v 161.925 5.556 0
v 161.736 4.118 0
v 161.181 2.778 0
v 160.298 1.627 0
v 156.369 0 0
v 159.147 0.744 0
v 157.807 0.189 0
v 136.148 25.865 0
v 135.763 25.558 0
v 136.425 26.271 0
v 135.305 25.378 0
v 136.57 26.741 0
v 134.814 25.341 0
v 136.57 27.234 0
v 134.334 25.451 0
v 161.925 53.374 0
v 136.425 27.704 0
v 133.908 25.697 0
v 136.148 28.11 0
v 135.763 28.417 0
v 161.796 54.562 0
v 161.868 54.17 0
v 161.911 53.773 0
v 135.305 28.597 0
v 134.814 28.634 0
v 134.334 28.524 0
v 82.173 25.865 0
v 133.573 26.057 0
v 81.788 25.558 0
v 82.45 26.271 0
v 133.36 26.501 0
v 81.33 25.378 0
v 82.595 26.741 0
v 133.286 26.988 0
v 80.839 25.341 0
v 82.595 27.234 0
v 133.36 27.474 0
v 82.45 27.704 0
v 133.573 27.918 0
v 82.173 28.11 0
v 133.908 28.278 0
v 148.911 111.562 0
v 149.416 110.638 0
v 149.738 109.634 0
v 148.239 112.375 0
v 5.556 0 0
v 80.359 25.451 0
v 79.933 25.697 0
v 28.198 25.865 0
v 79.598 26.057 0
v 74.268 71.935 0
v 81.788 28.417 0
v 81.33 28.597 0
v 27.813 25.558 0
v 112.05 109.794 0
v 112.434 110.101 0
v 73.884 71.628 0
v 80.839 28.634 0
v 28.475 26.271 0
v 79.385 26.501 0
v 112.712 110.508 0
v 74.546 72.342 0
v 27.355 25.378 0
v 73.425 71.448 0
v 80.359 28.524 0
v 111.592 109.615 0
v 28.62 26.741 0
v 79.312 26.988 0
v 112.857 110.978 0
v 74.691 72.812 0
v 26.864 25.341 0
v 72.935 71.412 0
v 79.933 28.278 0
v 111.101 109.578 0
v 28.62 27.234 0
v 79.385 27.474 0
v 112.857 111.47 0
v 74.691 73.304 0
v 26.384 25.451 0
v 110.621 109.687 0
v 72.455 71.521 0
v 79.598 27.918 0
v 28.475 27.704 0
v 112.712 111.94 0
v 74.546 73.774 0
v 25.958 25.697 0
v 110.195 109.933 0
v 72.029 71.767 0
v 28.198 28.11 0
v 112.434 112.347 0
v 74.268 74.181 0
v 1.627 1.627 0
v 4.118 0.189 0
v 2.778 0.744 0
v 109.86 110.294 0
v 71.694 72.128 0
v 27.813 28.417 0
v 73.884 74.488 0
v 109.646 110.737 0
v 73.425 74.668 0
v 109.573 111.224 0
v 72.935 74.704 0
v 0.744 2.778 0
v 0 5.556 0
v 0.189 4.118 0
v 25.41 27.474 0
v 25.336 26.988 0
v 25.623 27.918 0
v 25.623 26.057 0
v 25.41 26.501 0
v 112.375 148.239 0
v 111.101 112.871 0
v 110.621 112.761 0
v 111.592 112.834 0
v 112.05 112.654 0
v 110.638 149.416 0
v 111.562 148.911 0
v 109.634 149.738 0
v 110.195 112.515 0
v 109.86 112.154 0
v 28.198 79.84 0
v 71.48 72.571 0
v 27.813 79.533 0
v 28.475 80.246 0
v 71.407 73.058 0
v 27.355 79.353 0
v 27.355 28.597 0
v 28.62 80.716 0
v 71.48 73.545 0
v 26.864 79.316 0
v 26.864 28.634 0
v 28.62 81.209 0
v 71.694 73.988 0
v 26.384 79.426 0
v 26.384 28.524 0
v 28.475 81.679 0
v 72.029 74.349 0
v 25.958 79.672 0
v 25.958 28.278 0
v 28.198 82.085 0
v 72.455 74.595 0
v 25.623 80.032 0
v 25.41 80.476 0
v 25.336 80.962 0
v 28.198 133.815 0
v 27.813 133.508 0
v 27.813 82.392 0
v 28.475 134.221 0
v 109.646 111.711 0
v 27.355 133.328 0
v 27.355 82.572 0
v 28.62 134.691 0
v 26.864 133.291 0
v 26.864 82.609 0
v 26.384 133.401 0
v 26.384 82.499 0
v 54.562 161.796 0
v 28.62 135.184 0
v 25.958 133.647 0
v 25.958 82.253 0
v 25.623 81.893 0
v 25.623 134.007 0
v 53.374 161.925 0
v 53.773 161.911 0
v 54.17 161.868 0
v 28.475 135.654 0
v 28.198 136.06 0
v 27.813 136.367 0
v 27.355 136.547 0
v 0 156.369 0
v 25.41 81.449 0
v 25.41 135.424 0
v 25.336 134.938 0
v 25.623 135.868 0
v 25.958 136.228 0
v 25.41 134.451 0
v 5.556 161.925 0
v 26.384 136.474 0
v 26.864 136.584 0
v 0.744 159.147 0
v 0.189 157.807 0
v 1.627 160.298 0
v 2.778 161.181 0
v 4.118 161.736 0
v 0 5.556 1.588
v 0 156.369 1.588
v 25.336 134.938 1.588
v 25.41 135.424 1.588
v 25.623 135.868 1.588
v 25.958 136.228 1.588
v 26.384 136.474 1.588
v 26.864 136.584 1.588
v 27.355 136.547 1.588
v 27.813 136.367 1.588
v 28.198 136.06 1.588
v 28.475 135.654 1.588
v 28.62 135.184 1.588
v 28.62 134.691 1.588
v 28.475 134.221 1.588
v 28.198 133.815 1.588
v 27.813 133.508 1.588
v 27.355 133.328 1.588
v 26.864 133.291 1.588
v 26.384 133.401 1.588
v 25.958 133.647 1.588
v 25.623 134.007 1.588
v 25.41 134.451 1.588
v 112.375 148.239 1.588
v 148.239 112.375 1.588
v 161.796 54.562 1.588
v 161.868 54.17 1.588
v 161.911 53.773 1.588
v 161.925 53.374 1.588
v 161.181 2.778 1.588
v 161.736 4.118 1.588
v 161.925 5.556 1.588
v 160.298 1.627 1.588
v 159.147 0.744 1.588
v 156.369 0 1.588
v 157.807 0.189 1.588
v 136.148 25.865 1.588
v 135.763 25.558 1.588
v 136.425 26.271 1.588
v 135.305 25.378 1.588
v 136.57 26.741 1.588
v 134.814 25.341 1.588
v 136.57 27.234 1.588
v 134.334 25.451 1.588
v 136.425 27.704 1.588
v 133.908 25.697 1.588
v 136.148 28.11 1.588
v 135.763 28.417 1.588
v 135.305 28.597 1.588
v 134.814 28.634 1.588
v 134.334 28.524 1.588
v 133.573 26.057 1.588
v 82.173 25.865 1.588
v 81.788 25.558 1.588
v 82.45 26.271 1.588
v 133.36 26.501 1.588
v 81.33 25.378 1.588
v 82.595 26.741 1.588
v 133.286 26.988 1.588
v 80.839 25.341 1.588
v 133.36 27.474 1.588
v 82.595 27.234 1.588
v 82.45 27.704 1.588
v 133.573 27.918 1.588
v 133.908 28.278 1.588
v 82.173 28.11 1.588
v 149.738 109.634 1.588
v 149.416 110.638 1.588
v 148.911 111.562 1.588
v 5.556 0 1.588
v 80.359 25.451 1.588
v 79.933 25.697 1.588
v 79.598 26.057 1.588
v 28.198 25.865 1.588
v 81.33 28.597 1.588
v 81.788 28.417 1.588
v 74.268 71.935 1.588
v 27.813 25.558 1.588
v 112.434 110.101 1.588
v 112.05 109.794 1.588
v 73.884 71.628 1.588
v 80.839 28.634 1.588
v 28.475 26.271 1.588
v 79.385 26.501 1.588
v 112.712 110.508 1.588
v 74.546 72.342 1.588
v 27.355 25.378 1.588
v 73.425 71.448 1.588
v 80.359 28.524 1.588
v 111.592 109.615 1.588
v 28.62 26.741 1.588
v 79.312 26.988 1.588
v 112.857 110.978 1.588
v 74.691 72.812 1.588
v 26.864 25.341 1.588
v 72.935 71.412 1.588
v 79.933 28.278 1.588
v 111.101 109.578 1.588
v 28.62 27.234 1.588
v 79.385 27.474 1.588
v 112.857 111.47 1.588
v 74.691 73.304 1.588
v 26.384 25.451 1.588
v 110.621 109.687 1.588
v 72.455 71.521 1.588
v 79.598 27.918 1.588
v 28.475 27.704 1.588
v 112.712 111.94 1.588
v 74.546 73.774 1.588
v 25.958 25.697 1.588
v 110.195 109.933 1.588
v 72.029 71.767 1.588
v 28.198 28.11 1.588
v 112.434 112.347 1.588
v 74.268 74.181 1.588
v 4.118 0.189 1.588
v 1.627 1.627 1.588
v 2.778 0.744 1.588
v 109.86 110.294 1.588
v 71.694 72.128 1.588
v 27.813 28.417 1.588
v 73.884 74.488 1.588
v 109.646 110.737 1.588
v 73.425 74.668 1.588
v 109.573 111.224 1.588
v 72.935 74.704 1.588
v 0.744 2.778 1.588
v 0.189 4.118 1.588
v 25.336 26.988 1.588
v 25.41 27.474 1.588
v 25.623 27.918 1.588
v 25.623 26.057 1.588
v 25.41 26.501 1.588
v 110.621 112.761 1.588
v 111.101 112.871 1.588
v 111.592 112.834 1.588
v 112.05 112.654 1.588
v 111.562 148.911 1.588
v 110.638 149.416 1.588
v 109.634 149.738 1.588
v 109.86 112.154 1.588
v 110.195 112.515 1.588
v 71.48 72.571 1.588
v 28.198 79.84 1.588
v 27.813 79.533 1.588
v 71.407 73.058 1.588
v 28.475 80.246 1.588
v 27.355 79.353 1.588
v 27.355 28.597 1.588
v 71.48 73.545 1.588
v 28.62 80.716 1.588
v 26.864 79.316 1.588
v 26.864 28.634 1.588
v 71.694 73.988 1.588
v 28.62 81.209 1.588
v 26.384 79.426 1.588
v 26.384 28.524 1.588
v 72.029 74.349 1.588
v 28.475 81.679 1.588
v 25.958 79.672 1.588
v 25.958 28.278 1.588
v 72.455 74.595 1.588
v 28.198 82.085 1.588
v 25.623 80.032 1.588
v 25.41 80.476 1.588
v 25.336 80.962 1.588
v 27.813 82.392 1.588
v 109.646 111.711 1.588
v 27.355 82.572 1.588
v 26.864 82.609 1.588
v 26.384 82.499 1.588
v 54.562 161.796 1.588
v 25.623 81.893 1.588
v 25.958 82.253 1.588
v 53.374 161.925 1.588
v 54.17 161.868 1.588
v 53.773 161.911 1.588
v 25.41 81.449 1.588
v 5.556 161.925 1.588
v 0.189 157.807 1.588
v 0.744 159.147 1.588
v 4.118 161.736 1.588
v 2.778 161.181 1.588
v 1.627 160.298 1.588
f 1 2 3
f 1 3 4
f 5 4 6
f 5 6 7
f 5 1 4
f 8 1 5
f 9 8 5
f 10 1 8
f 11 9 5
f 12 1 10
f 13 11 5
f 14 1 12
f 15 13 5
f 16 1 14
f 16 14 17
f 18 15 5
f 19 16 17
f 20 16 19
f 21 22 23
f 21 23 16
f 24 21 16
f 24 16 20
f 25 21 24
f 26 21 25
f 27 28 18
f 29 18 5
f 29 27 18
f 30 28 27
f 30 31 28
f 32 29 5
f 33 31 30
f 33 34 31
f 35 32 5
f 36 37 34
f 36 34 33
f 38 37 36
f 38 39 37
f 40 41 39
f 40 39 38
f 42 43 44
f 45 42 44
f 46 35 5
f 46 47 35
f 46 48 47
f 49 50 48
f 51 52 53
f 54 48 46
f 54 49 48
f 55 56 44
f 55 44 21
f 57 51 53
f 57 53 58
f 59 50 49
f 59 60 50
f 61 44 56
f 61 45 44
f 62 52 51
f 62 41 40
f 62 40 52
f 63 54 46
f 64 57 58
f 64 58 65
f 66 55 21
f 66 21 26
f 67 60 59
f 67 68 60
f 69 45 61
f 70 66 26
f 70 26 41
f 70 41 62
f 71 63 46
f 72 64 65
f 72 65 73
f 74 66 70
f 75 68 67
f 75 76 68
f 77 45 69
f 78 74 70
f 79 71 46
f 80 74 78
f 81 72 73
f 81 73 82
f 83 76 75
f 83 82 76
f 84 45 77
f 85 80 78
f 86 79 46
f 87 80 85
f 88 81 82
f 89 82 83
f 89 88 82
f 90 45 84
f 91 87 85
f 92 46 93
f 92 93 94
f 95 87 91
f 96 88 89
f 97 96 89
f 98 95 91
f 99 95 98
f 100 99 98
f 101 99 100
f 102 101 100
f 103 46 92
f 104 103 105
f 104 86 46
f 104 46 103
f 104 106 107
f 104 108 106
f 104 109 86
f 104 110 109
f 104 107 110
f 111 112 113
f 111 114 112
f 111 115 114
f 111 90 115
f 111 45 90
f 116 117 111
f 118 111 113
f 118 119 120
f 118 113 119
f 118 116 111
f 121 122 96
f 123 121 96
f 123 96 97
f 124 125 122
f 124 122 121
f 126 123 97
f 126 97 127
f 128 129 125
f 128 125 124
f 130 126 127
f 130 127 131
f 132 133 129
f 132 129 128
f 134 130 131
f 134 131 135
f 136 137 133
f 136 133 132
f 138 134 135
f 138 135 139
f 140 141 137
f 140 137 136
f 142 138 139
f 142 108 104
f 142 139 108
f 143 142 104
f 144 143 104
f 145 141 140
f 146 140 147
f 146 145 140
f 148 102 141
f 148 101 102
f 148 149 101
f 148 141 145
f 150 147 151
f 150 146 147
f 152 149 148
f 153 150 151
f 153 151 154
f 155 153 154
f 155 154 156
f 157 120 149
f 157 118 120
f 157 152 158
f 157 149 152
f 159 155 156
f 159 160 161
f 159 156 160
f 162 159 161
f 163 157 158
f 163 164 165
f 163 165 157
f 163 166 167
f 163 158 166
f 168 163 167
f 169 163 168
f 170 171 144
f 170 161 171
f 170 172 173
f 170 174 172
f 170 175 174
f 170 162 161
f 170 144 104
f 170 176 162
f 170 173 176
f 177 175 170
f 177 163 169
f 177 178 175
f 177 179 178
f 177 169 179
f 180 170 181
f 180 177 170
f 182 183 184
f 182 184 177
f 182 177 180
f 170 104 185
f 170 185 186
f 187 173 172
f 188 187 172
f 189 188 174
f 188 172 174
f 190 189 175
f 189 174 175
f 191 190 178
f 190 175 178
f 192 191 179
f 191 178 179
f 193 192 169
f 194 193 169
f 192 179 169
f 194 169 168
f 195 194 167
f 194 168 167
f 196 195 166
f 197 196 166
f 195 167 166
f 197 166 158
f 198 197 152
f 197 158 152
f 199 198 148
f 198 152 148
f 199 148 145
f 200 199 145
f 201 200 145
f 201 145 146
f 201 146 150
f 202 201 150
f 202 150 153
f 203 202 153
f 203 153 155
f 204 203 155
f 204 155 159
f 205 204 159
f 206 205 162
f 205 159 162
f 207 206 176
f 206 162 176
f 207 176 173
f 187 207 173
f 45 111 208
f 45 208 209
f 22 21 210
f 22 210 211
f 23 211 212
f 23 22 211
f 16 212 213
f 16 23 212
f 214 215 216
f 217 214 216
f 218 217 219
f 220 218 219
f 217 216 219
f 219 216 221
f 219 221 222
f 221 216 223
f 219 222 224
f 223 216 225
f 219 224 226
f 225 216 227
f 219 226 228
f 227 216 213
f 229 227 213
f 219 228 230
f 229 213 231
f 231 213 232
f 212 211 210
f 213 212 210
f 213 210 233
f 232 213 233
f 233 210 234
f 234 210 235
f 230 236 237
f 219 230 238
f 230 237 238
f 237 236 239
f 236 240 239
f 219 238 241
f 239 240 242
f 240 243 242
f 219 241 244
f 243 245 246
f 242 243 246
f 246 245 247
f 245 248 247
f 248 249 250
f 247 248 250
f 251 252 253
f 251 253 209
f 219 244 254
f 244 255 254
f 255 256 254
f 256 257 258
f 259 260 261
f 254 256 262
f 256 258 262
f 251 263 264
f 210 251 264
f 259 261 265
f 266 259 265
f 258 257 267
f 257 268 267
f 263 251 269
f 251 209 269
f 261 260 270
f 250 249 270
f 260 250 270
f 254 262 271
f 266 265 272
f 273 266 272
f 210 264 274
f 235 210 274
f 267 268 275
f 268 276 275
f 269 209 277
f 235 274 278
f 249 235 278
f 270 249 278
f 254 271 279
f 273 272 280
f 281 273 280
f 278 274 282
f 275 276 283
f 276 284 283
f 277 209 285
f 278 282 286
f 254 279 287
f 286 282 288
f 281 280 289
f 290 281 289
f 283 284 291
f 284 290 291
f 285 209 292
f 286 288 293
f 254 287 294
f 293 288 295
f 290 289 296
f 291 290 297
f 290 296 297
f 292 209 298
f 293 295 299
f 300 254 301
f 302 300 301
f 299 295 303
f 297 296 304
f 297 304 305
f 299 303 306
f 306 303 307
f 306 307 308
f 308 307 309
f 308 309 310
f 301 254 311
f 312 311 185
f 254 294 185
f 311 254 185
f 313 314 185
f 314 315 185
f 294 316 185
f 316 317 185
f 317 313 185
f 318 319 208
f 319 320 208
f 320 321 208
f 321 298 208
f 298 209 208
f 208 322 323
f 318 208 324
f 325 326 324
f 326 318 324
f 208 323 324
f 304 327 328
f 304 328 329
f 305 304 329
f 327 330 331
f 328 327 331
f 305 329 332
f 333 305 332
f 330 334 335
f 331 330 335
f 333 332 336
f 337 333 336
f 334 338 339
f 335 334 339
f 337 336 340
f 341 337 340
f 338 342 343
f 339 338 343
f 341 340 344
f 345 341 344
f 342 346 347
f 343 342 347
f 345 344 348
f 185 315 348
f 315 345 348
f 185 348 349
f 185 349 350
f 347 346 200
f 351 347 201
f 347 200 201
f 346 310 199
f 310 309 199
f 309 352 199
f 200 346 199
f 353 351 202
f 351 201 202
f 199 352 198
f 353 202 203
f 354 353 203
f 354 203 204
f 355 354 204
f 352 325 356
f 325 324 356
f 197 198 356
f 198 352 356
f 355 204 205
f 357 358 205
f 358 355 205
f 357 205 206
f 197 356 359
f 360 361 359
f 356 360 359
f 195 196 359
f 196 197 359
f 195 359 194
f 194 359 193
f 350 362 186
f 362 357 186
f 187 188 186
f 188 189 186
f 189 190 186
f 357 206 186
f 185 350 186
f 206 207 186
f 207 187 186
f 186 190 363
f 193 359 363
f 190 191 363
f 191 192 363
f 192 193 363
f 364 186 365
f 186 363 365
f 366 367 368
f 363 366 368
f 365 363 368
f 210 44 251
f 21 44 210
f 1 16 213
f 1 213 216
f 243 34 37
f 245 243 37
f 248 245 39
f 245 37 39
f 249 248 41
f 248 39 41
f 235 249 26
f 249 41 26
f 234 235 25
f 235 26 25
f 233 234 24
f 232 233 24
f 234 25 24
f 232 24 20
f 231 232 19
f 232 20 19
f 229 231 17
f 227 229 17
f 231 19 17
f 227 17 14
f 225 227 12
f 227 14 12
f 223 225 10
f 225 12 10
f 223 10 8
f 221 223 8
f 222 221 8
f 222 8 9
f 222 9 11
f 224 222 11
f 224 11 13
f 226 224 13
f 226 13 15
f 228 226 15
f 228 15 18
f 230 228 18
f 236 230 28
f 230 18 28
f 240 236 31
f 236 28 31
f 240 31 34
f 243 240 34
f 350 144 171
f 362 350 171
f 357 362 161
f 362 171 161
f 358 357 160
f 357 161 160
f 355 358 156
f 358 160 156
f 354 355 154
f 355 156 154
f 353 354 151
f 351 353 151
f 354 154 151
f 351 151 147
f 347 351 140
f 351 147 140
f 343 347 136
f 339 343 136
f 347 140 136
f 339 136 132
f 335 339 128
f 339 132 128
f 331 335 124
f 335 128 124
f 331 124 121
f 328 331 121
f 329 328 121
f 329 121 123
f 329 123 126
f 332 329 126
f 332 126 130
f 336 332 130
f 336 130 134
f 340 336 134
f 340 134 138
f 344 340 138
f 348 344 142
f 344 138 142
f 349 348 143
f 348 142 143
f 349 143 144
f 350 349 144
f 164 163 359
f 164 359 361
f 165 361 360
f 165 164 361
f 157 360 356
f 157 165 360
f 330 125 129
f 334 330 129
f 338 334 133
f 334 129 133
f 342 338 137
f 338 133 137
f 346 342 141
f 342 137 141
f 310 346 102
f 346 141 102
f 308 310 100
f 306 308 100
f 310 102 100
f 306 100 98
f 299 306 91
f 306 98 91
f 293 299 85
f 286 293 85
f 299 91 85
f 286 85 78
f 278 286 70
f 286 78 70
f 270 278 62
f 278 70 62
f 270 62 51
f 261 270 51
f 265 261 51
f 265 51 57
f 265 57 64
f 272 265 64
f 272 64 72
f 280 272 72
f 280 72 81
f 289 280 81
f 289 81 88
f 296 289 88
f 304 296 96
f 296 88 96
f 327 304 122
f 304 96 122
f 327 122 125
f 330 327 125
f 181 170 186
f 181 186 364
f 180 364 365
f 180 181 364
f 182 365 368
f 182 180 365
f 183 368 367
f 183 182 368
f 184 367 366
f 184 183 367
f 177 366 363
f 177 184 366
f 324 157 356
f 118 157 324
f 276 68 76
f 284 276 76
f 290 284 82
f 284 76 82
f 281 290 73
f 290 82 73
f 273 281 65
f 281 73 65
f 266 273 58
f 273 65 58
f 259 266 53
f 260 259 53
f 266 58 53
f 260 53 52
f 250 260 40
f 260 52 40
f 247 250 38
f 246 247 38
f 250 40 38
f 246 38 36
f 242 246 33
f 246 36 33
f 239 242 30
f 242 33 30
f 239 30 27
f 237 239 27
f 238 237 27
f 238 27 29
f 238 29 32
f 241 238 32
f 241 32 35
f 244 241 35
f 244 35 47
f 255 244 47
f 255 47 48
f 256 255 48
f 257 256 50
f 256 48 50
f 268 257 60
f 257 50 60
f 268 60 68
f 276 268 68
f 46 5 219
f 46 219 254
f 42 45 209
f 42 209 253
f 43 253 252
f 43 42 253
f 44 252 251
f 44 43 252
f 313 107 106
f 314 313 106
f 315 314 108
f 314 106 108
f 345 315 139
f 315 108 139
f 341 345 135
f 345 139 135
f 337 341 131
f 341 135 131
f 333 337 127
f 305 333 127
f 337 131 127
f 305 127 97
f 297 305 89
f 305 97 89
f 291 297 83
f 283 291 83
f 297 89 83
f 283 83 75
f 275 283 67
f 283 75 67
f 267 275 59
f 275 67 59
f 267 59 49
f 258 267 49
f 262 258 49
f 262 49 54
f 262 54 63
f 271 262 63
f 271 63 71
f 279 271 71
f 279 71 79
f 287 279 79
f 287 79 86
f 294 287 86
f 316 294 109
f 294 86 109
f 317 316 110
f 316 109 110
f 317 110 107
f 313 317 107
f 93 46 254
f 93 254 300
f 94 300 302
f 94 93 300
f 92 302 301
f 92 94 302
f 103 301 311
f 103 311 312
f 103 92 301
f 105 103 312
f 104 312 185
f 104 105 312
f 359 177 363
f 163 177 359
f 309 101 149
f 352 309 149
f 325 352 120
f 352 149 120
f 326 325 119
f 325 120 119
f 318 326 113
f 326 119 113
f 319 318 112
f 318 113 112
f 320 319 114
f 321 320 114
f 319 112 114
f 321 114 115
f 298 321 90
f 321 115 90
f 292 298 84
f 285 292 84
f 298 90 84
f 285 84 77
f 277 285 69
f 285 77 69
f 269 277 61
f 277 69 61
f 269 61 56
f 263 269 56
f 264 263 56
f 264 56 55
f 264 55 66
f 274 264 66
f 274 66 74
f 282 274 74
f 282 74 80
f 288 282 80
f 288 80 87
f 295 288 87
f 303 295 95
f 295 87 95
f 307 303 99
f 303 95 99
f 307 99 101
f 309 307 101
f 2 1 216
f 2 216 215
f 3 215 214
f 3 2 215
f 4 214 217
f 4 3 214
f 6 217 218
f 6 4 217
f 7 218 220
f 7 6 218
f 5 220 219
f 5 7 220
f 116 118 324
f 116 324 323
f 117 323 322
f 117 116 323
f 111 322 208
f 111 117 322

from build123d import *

# Parameters (mm, degrees)
SKETCH1_R           = 1.651
BOSS_EXTRUDE1_DEPTH = 1.5875


with BuildPart() as part:
    # Sketch1 → Boss-Extrude1 (new body)
    with BuildSketch(Plane(origin=(0, 0, 0), x_dir=(-1, 0, 0), z_dir=(0, 0, -1))):
        with BuildLine():
            Line((-156.36875, 0), (-5.55625, 0))
            ThreePointArc((-5.55625, 0), (-1.627387947, 1.627387947), (0, 5.55625))
            Line((0, 5.55625), (0, 156.368750002))
            ThreePointArc((0, 156.368750002), (-1.627387947, 160.297612055), (-5.55625, 161.925000002))
            Line((-5.55625, 161.925000002), (-53.373846022, 161.925000002))
            ThreePointArc((-53.373846022, 161.925000002), (-53.971512021, 161.892762078), (-54.562242583, 161.796422402))
            Line((-54.562242583, 161.796422402), (-109.634404321, 149.738294575))
            ThreePointArc((-109.634404321, 149.738294575), (-111.112127046, 149.185426993), (-112.374869815, 148.239484227))
            Line((-112.374869815, 148.239484227), (-148.239484217, 112.374869825))
            ThreePointArc((-148.239484217, 112.374869825), (-149.185426983, 111.112127057), (-149.738294565, 109.634404332))
            Line((-149.738294565, 109.634404332), (-161.796422399, 54.562242596))
            ThreePointArc((-161.796422399, 54.562242596), (-161.892762076, 53.971512033), (-161.925, 53.373846033))
            Line((-161.925, 53.373846033), (-161.925, 5.55625))
            ThreePointArc((-161.925, 5.55625), (-160.297612053, 1.627387947), (-156.36875, 0))
        make_face()
        with Locations((-26.9875, 134.9375)):
            Circle(SKETCH1_R, mode=Mode.SUBTRACT)
        with Locations((-26.9875, 80.9625)):
            Circle(SKETCH1_R, mode=Mode.SUBTRACT)
        with Locations((-26.9875, 26.9875)):
            Circle(SKETCH1_R, mode=Mode.SUBTRACT)
        with Locations((-134.9375, 26.9875)):
            Circle(SKETCH1_R, mode=Mode.SUBTRACT)
        with Locations((-73.058044257, 73.058044257)):
            Circle(SKETCH1_R, mode=Mode.SUBTRACT)
        with Locations((-111.224132771, 111.224132771)):
            Circle(SKETCH1_R, mode=Mode.SUBTRACT)
        with Locations((-80.9625, 26.9875)):
            Circle(SKETCH1_R, mode=Mode.SUBTRACT)
    extrude(amount=-BOSS_EXTRUDE1_DEPTH)


solid = part.part
